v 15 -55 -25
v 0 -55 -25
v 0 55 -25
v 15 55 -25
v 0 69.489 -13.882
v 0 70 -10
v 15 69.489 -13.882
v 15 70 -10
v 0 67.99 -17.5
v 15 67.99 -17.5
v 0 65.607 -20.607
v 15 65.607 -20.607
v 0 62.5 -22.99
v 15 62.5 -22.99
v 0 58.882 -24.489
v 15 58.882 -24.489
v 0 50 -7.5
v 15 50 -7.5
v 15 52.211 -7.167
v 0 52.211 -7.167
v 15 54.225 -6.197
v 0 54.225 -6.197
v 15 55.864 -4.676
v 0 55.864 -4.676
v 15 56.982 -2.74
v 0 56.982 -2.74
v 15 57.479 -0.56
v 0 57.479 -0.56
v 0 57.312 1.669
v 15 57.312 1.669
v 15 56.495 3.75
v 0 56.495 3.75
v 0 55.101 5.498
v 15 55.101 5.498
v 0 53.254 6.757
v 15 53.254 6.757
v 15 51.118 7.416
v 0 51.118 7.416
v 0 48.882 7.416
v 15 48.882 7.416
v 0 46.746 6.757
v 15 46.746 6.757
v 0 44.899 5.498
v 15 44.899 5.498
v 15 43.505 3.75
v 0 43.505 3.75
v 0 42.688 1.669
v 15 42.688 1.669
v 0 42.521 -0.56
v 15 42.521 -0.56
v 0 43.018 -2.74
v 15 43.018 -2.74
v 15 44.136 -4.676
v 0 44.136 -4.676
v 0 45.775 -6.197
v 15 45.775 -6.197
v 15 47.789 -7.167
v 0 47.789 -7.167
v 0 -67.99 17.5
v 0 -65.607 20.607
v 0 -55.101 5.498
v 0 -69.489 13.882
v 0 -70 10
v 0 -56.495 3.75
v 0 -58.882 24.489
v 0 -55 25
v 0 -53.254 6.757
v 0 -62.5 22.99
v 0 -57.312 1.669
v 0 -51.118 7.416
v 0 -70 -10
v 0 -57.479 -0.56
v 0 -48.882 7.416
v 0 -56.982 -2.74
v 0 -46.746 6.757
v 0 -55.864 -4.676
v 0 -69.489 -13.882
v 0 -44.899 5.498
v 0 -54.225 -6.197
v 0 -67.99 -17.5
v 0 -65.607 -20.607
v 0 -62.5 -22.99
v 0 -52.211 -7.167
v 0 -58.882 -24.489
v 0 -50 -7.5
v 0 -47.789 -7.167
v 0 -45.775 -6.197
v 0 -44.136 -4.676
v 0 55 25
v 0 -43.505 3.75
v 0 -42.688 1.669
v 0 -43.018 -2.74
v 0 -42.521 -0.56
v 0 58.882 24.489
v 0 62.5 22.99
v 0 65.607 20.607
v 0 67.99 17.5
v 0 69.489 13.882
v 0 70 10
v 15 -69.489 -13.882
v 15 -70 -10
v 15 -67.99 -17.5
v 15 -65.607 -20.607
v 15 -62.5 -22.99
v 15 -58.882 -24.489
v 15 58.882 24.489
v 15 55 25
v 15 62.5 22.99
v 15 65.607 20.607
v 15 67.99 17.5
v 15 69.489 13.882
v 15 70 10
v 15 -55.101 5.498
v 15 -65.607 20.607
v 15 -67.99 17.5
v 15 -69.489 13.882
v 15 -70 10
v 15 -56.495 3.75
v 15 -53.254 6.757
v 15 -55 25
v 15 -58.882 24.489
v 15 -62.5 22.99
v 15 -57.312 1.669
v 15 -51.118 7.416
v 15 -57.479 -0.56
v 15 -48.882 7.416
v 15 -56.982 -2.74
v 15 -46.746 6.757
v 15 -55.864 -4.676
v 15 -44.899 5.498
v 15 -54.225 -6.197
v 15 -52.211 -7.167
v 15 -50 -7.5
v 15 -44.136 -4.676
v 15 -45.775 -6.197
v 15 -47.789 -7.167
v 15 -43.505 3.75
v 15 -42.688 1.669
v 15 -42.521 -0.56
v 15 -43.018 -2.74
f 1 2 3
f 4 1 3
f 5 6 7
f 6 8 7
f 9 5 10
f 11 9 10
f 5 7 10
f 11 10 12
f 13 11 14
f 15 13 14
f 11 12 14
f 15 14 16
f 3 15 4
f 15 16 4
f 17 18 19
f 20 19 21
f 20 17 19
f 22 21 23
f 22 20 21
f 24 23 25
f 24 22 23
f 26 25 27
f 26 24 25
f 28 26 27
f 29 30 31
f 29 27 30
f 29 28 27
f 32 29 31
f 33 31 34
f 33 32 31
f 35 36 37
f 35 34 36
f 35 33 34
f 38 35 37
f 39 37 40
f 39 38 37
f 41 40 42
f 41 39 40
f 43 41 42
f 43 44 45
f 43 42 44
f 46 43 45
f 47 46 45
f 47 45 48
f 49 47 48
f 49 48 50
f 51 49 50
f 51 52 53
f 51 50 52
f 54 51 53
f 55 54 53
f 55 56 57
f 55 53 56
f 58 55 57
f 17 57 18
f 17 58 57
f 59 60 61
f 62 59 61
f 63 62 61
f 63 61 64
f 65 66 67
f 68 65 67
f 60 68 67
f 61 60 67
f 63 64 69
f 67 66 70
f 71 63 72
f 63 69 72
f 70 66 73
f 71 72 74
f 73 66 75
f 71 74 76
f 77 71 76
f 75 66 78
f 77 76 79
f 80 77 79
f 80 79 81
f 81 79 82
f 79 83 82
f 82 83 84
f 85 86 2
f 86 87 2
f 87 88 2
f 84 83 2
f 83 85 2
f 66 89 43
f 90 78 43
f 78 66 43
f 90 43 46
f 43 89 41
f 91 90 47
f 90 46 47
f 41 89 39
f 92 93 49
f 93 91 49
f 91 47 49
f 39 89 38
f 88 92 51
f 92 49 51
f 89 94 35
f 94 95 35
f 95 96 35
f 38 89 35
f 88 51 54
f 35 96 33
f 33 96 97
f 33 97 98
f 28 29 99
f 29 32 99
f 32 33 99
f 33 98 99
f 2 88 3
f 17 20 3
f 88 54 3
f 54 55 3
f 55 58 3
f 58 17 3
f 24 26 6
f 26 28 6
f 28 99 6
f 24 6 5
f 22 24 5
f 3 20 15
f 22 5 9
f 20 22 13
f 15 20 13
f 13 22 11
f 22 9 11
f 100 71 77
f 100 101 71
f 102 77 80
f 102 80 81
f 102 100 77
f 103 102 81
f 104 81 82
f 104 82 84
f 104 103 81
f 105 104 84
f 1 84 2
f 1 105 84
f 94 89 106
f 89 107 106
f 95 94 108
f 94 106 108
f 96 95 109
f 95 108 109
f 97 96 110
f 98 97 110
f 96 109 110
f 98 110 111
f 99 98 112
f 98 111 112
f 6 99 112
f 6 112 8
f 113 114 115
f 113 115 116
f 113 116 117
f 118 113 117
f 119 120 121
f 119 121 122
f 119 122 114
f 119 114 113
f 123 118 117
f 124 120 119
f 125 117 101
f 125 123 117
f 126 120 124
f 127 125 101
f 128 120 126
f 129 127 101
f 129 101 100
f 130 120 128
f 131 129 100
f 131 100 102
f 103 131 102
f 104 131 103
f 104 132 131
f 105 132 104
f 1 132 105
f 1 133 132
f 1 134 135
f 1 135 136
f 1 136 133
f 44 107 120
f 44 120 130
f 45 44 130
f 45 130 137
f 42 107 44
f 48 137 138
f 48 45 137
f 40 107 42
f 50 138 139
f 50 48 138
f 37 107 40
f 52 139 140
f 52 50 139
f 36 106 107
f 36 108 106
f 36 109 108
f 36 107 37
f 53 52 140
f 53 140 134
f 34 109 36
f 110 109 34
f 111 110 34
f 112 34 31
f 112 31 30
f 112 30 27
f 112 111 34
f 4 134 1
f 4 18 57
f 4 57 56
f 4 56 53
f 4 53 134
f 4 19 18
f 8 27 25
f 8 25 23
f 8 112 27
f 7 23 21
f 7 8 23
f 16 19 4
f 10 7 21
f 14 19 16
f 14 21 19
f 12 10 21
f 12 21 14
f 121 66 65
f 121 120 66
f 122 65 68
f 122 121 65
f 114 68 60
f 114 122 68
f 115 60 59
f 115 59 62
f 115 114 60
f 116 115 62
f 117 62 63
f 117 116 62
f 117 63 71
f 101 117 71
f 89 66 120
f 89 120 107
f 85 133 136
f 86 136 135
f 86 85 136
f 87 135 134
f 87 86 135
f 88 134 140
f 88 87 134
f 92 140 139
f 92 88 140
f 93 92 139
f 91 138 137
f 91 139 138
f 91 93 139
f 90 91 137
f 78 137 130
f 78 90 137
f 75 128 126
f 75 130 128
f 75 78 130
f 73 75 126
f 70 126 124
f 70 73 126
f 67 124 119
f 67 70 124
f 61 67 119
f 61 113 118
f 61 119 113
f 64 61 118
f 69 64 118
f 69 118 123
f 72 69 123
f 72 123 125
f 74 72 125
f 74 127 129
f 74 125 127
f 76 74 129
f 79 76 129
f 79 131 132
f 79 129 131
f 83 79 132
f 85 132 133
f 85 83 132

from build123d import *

# Parameters (mm, degrees)
SKETCH1_W           = 50
SKETCH1_H           = 140
BOSS_EXTRUDE1_DEPTH = 15
SKETCH1_3_R         = 7.5
CUT_EXTRUDE1_DEPTH  = 76.828754441
FILLET1_R           = 15


with BuildPart() as part:
    # Sketch1 → Boss-Extrude1 (new body)
    with BuildSketch(Plane(origin=(0, 0, 0), x_dir=(0, 0, -1), z_dir=(1, 0, 0))):
        Rectangle(SKETCH1_W, SKETCH1_H)
    extrude(amount=BOSS_EXTRUDE1_DEPTH)

    # Sketch1<3> → Cut-Extrude1 (cut, through all)
    with BuildSketch(Plane(origin=(0, 0, 0), x_dir=(0, 0, -1), z_dir=(1, 0, 0))):
        with Locations((0, 50)):
            Circle(SKETCH1_3_R)
        with Locations((0, -50)):
            Circle(SKETCH1_3_R)
    extrude(amount=CUT_EXTRUDE1_DEPTH, mode=Mode.SUBTRACT)

    # Fillet1
    fillet1_edges = [part.edges().sort_by_distance(p)[0] for p in [
        (7.5, -70, -25),
        (7.5, -70, 25),
        (7.5, 70, 25),
        (7.5, 70, -25),
    ]]
    fillet(fillet1_edges, radius=FILLET1_R)


solid = part.part
